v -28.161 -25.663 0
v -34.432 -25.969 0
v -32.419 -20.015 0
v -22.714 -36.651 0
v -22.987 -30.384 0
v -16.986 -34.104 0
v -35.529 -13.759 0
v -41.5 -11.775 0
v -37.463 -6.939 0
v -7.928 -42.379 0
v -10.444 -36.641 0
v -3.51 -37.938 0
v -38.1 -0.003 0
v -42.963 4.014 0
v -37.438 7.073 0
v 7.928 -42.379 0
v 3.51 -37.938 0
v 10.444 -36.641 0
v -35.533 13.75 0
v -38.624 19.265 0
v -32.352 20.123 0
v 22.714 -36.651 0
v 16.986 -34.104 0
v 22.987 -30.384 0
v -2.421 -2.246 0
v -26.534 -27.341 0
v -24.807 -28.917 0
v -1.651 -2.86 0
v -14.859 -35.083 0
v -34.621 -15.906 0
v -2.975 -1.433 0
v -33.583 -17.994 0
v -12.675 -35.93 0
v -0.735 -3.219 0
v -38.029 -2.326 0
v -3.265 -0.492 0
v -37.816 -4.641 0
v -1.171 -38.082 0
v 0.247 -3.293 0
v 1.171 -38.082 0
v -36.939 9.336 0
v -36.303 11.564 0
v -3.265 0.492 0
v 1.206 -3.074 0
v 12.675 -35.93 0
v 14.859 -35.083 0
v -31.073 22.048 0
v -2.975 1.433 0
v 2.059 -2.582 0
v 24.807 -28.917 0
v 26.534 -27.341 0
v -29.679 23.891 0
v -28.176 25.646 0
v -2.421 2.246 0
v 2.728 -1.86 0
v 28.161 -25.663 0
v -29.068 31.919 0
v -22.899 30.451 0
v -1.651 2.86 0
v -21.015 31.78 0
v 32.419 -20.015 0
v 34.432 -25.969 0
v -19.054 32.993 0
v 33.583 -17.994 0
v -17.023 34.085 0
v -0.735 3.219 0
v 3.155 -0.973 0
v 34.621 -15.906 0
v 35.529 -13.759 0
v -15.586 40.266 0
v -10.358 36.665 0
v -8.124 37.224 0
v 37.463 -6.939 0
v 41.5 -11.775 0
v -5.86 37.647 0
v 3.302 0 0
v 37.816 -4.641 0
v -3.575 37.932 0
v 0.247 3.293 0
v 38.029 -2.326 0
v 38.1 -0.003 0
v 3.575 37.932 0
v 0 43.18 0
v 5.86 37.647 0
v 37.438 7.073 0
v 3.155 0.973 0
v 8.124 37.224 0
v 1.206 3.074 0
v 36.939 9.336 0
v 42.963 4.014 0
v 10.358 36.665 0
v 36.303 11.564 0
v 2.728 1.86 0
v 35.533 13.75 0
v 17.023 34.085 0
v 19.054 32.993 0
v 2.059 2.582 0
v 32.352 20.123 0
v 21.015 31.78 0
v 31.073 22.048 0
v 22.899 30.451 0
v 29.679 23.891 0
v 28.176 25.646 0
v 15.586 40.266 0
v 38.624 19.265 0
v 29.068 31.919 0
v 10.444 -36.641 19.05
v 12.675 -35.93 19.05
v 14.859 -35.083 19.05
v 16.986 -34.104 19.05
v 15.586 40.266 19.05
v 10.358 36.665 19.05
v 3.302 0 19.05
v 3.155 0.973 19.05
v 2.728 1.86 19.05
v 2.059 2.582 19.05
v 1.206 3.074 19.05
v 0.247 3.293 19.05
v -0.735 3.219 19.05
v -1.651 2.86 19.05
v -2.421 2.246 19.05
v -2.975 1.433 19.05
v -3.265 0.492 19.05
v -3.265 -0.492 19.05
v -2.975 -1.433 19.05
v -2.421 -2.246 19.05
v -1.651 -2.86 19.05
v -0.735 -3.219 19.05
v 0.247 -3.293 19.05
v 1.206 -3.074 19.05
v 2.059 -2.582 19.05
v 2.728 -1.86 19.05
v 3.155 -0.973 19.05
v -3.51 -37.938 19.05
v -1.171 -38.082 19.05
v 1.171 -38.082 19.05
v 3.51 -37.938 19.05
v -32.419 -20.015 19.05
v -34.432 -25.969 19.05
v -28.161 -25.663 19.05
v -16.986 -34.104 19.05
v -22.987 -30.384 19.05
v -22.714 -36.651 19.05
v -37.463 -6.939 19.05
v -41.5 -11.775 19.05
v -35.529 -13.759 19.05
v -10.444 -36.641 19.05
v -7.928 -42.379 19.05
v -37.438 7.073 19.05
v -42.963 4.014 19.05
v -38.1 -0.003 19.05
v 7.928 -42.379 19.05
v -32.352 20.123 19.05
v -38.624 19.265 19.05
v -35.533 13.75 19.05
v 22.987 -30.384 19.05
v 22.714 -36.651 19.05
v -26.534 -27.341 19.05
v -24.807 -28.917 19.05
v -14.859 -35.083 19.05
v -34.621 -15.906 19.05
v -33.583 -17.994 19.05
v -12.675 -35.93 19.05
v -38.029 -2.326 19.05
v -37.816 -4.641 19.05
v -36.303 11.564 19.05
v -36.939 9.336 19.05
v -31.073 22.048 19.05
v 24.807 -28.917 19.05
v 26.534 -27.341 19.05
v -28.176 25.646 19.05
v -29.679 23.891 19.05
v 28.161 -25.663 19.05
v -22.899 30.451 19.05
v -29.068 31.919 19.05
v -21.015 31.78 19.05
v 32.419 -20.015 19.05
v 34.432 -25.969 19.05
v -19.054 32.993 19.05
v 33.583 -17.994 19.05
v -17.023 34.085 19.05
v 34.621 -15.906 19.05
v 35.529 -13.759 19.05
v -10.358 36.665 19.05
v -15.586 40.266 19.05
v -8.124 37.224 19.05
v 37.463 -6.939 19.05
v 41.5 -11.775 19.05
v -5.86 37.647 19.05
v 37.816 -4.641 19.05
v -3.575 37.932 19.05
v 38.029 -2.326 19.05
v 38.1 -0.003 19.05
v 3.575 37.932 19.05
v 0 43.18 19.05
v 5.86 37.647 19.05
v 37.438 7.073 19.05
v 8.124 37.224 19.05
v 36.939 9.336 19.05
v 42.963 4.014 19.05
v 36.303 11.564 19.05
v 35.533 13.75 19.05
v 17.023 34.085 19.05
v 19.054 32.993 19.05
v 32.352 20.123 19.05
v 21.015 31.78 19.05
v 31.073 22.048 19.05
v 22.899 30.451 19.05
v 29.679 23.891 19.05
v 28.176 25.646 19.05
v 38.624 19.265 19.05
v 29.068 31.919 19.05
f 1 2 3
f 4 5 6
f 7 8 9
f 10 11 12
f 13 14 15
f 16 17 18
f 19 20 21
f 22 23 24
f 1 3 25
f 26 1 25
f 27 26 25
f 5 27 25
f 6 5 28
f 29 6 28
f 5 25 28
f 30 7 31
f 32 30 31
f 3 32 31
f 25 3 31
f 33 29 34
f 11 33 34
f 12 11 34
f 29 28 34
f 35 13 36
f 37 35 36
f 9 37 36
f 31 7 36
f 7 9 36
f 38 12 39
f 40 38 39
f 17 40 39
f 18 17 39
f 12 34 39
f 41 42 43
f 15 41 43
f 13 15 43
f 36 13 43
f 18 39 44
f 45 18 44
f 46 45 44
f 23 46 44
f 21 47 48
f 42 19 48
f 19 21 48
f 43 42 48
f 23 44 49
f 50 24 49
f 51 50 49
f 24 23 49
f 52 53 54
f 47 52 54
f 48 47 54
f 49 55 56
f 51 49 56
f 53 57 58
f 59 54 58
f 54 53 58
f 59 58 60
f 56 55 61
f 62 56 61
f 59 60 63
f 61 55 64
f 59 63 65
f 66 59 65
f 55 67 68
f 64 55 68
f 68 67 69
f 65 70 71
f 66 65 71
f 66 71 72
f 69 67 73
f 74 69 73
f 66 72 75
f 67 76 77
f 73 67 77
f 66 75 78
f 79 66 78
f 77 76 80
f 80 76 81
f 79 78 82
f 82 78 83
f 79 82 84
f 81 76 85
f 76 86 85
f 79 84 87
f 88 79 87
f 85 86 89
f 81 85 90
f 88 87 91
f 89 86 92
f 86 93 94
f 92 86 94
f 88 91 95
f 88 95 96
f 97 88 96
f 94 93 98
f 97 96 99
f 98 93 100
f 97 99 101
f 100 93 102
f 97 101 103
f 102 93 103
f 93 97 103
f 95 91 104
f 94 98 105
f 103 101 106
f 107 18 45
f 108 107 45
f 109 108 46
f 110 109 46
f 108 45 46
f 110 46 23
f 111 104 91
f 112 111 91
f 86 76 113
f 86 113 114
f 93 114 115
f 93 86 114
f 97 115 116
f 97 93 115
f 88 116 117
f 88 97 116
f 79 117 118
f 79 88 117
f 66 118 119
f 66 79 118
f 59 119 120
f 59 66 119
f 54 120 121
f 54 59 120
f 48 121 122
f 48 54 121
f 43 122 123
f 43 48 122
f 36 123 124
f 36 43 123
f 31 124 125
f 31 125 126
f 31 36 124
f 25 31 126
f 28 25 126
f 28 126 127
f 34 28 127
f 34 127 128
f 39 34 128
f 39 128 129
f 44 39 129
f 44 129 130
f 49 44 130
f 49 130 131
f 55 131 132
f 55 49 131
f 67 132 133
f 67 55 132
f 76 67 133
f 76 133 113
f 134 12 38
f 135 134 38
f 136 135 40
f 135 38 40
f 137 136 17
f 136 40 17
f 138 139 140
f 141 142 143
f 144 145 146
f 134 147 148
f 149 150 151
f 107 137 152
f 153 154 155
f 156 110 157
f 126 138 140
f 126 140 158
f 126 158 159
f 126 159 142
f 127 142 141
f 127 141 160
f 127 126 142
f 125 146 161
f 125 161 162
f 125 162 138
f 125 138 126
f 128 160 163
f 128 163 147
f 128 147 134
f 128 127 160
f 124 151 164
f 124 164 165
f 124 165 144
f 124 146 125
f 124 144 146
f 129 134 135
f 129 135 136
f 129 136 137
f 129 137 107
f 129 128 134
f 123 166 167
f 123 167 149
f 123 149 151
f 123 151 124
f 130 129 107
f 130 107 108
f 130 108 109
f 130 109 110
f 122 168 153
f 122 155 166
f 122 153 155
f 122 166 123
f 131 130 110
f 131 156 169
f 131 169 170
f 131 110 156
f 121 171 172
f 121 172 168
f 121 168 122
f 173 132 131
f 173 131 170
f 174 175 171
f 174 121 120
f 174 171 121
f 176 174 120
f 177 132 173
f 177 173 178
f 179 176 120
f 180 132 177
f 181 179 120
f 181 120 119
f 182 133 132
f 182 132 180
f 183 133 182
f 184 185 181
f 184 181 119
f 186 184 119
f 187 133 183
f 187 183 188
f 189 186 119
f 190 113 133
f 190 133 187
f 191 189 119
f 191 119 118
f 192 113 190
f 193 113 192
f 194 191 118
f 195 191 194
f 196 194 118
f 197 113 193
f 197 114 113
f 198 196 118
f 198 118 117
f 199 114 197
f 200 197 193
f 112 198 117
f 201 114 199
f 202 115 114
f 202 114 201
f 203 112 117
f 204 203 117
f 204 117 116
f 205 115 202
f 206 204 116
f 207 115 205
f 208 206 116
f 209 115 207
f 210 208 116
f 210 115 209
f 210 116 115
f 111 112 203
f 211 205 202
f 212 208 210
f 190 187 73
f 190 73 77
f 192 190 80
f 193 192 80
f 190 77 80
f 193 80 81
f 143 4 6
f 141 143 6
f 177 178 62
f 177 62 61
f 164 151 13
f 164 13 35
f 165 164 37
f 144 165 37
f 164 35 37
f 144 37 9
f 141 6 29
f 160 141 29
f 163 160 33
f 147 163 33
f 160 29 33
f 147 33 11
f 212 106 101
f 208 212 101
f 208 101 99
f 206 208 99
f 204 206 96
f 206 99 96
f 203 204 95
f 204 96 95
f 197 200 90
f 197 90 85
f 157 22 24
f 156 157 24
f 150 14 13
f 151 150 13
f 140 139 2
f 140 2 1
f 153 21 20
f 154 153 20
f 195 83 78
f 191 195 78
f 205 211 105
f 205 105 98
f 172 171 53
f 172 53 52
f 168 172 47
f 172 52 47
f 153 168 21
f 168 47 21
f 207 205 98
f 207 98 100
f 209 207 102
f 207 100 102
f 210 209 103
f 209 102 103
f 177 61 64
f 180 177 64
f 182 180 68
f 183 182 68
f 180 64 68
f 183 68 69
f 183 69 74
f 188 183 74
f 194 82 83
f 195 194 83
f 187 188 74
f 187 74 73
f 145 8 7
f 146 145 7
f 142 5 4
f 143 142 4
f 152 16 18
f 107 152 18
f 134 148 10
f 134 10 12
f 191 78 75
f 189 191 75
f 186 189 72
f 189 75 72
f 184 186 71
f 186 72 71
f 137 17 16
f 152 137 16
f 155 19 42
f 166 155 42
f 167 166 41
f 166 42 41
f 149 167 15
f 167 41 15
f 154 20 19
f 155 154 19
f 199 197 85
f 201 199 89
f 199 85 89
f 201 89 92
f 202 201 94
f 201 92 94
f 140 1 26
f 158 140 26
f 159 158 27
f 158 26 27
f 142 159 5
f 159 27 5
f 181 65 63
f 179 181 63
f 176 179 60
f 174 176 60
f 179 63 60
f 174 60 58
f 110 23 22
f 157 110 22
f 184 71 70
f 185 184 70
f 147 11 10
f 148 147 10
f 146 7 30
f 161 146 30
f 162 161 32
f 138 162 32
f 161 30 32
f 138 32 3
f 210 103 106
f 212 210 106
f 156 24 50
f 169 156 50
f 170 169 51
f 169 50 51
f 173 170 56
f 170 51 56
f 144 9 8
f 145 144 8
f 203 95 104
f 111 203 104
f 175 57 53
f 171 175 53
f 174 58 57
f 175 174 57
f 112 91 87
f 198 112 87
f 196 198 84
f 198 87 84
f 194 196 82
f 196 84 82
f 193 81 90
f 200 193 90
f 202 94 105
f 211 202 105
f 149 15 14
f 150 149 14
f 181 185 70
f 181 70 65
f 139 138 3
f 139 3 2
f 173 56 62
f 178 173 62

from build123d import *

# Parameters (mm, degrees)
F0_R     = 3.302
F1_DEPTH = 19.05


with BuildPart() as f1:
    # F0 (on Top) → F1 (new body)
    with BuildSketch(Plane.XY):
        with BuildLine():
            ThreePointArc((10.3583260114, 36.6649025942), (6.9953685106, 37.4523005889), (3.5749223592, 37.9319117647))
            ThreePointArc((3.5749223592, 37.9319117647), (1.7894359118, 38.0579547417), (0, 38.1))
            ThreePointArc((0, 38.1), (-1.7894359118, 38.0579547417), (-3.5749223592, 37.9319117647))
            ThreePointArc((-3.5749223592, 37.9319117647), (-6.9953685106, 37.4523005889), (-10.3583260114, 36.6649025942))
            ThreePointArc((-10.3583260114, 36.6649025942), (-12.0685716334, 36.1380627418), (-13.7521919191, 35.5314961326))
            ThreePointArc((-13.7521919191, 35.5314961326), (-15.4046733923, 34.8468942329), (-17.0232026859, 34.0854891459))
            ThreePointArc((-17.0232026859, 34.0854891459), (-20.043465356, 32.4016897171), (-22.8986264736, 30.450991866))
            ThreePointArc((-22.8986264736, 30.450991866), (-24.3017474593, 29.3433990946), (-25.6513716497, 28.1712110583))
            ThreePointArc((-25.6513716497, 28.1712110583), (-26.9433776908, 26.9381587829), (-28.1761796584, 25.6459139017))
            ThreePointArc((-28.1761796584, 25.6459139017), (-30.3898416418, 22.9797198631), (-32.3520943167, 20.1234190266))
            ThreePointArc((-32.3520943167, 20.1234190266), (-33.2587932077, 18.5866262234), (-34.0925451571, 17.0090671323))
            ThreePointArc((-34.0925451571, 17.0090671323), (-34.850649889, 15.3961749248), (-35.5325008857, 13.7495956597))
            ThreePointArc((-35.5325008857, 13.7495956597), (-36.6375523151, 10.4546525701), (-37.4377693794, 7.0727239376))
            ThreePointArc((-37.4377693794, 7.0727239376), (-37.7272799225, 5.3162345369), (-37.9344264404, 3.548139039))
            ThreePointArc((-37.9344264404, 3.548139039), (-38.0586453199, 1.7746876952), (-38.0999999094, -0.002627639))
            ThreePointArc((-38.0999999094, -0.002627639), (-37.9402497555, -3.4853189945), (-37.4628173003, -6.938826985))
            ThreePointArc((-37.4628173003, -6.938826985), (-37.0988170111, -8.6768529074), (-36.6542295707, -10.3960307125))
            ThreePointArc((-36.6542295707, -10.3960307125), (-36.1307521934, -12.0904402708), (-35.5289940754, -13.7586547304))
            ThreePointArc((-35.5289940754, -13.7586547304), (-34.1178249717, -16.9583023679), (-32.4192289635, -20.015084147))
            ThreePointArc((-32.4192289635, -20.015084147), (-31.4537756655, -21.5004650271), (-30.4203176662, -22.939360782))
            ThreePointArc((-30.4203176662, -22.939360782), (-29.3223073038, -24.3271924887), (-28.1610369919, -25.6625407071))
            ThreePointArc((-28.1610369919, -25.6625407071), (-25.6829106001, -28.1424608573), (-22.9873211216, -30.3840923454))
            ThreePointArc((-22.9873211216, -30.3840923454), (-21.5527887081, -31.4179454915), (-20.0718320683, -32.3841250835))
            ThreePointArc((-20.0718320683, -32.3841250835), (-18.5487381489, -33.279938598), (-16.9857473781, -34.1041696279))
            ThreePointArc((-16.9857473781, -34.1041696279), (-13.7735289525, -35.5232304302), (-10.4442981946, -36.6405053898))
            ThreePointArc((-10.4442981946, -36.6405053898), (-8.7349433821, -37.0851825412), (-7.0068164437, -37.4501605247))
            ThreePointArc((-7.0068164437, -37.4501605247), (-5.2640649753, -37.7345944716), (-3.5100061972, -37.9379738059))
            ThreePointArc((-3.5100061972, -37.9379738059), (0, -38.1), (3.5100061972, -37.9379738059))
            ThreePointArc((3.5100061972, -37.9379738059), (5.2640649753, -37.7345944716), (7.0068164437, -37.4501605247))
            ThreePointArc((7.0068164437, -37.4501605247), (8.7349433821, -37.0851825412), (10.4442981946, -36.6405053898))
            ThreePointArc((10.4442981946, -36.6405053898), (13.7735289525, -35.5232304302), (16.9857473781, -34.1041696279))
            ThreePointArc((16.9857473781, -34.1041696279), (18.5487381489, -33.279938598), (20.0718320683, -32.3841250835))
            ThreePointArc((20.0718320683, -32.3841250835), (21.5527887081, -31.4179454915), (22.9873211216, -30.3840923454))
            ThreePointArc((22.9873211216, -30.3840923454), (25.6829106001, -28.1424608573), (28.1610369919, -25.6625407071))
            ThreePointArc((28.1610369919, -25.6625407071), (29.3223073038, -24.3271924887), (30.4203176662, -22.939360782))
            ThreePointArc((30.4203176662, -22.939360782), (31.4537756655, -21.5004650271), (32.4192289635, -20.015084147))
            ThreePointArc((32.4192289635, -20.015084147), (34.1178249717, -16.9583023679), (35.5289940754, -13.7586547304))
            ThreePointArc((35.5289940754, -13.7586547304), (36.1307521934, -12.0904402708), (36.6542295707, -10.3960307125))
            ThreePointArc((36.6542295707, -10.3960307125), (37.0988170111, -8.6768529074), (37.4628173003, -6.938826985))
            ThreePointArc((37.4628173003, -6.938826985), (37.9402497555, -3.4853189945), (38.0999999094, -0.002627639))
            ThreePointArc((38.0999999094, -0.002627639), (38.0999999773, -0.0013138195), (38.1, 0))
            ThreePointArc((38.1, 0), (38.0585840999, 1.7760000875), (37.9344264404, 3.548139039))
            ThreePointArc((37.9344264404, 3.548139039), (37.7272799225, 5.3162345369), (37.4377693794, 7.0727239376))
            ThreePointArc((37.4377693794, 7.0727239376), (36.6375523151, 10.4546525701), (35.5325008857, 13.7495956597))
            ThreePointArc((35.5325008857, 13.7495956597), (34.850649889, 15.3961749248), (34.0925451571, 17.0090671323))
            ThreePointArc((34.0925451571, 17.0090671323), (33.2587932077, 18.5866262234), (32.3520943167, 20.1234190266))
            ThreePointArc((32.3520943167, 20.1234190266), (30.3898416418, 22.9797198631), (28.1761796584, 25.6459139017))
            ThreePointArc((28.1761796584, 25.6459139017), (26.9433776908, 26.9381587829), (25.6513716497, 28.1712110583))
            ThreePointArc((25.6513716497, 28.1712110583), (24.3017474593, 29.3433990946), (22.8986264736, 30.450991866))
            ThreePointArc((22.8986264736, 30.450991866), (20.043465356, 32.4016897171), (17.0232026859, 34.0854891459))
            ThreePointArc((17.0232026859, 34.0854891459), (15.4046733923, 34.8468942329), (13.7521919191, 35.5314961326))
            ThreePointArc((13.7521919191, 35.5314961326), (12.0685716334, 36.1380627418), (10.3583260114, 36.6649025942))
        make_face()
        Circle(F0_R, mode=Mode.SUBTRACT)
        with BuildLine():
            ThreePointArc((0, 38.1), (1.7894359118, 38.0579547417), (3.5749223592, 37.9319117647))
            Line((3.5749223592, 37.9319117647), (0, 43.18))
            Line((0, 43.18), (0, 38.1))
        make_face()
        with BuildLine():
            ThreePointArc((-3.5749223592, 37.9319117647), (-1.7894359118, 38.0579547417), (0, 38.1))
            Line((0, 38.1), (0, 43.18))
            Line((0, 43.18), (-3.5749223592, 37.9319117647))
        make_face()
        with BuildLine():
            Line((15.5864953389, 40.2663790638), (10.3583260114, 36.6649025942))
            ThreePointArc((10.3583260114, 36.6649025942), (12.0685716334, 36.1380627418), (13.7521919191, 35.5314961326))
            Line((13.7521919191, 35.5314961326), (15.5864953389, 40.2663790638))
        make_face()
        with BuildLine():
            Line((15.5864953389, 40.2663790638), (13.7521919191, 35.5314961326))
            ThreePointArc((13.7521919191, 35.5314961326), (15.4046733923, 34.8468942329), (17.0232026859, 34.0854891459))
            Line((17.0232026859, 34.0854891459), (15.5864953389, 40.2663790638))
        make_face()
        with BuildLine():
            ThreePointArc((-13.7521919191, 35.5314961326), (-12.0685716334, 36.1380627418), (-10.3583260114, 36.6649025942))
            Line((-10.3583260114, 36.6649025942), (-15.5864953389, 40.2663790638))
            Line((-15.5864953389, 40.2663790638), (-13.7521919191, 35.5314961326))
        make_face()
        with BuildLine():
            ThreePointArc((-17.0232026859, 34.0854891459), (-15.4046733923, 34.8468942329), (-13.7521919191, 35.5314961326))
            Line((-13.7521919191, 35.5314961326), (-15.5864953389, 40.2663790638))
            Line((-15.5864953389, 40.2663790638), (-17.0232026859, 34.0854891459))
        make_face()
        with BuildLine():
            Line((29.0679481145, 31.9190169075), (22.8986264736, 30.450991866))
            ThreePointArc((22.8986264736, 30.450991866), (24.3017474593, 29.3433990946), (25.6513716497, 28.1712110583))
            Line((25.6513716497, 28.1712110583), (29.0679481145, 31.9190169075))
        make_face()
        with BuildLine():
            Line((29.0679481145, 31.9190169075), (25.6513716497, 28.1712110583))
            ThreePointArc((25.6513716497, 28.1712110583), (26.9433776908, 26.9381587829), (28.1761796584, 25.6459139017))
            Line((28.1761796584, 25.6459139017), (29.0679481145, 31.9190169075))
        make_face()
        with BuildLine():
            ThreePointArc((-25.6513716497, 28.1712110583), (-24.3017474593, 29.3433990946), (-22.8986264736, 30.450991866))
            Line((-22.8986264736, 30.450991866), (-29.0679481145, 31.9190169075))
            Line((-29.0679481145, 31.9190169075), (-25.6513716497, 28.1712110583))
        make_face()
        with BuildLine():
            ThreePointArc((-28.1761796584, 25.6459139017), (-26.9433776908, 26.9381587829), (-25.6513716497, 28.1712110583))
            Line((-25.6513716497, 28.1712110583), (-29.0679481145, 31.9190169075))
            Line((-29.0679481145, 31.9190169075), (-28.1761796584, 25.6459139017))
        make_face()
        with BuildLine():
            Line((38.6236134262, 19.2652710447), (32.3520943167, 20.1234190266))
            ThreePointArc((32.3520943167, 20.1234190266), (33.2587932077, 18.5866262234), (34.0925451571, 17.0090671323))
            Line((34.0925451571, 17.0090671323), (38.6236134262, 19.2652710447))
        make_face()
        with BuildLine():
            Line((38.6236134262, 19.2652710447), (34.0925451571, 17.0090671323))
            ThreePointArc((34.0925451571, 17.0090671323), (34.850649889, 15.3961749248), (35.5325008857, 13.7495956597))
            Line((35.5325008857, 13.7495956597), (38.6236134262, 19.2652710447))
        make_face()
        with BuildLine():
            ThreePointArc((-34.0925451571, 17.0090671323), (-33.2587932077, 18.5866262234), (-32.3520943167, 20.1234190266))
            Line((-32.3520943167, 20.1234190266), (-38.6236134262, 19.2652710447))
            Line((-38.6236134262, 19.2652710447), (-34.0925451571, 17.0090671323))
        make_face()
        with BuildLine():
            ThreePointArc((-35.5325008857, 13.7495956597), (-34.850649889, 15.3961749248), (-34.0925451571, 17.0090671323))
            Line((-34.0925451571, 17.0090671323), (-38.6236134262, 19.2652710447))
            Line((-38.6236134262, 19.2652710447), (-35.5325008857, 13.7495956597))
        make_face()
        with BuildLine():
            Line((42.9629457239, 4.014099971), (37.4377693794, 7.0727239376))
            ThreePointArc((37.4377693794, 7.0727239376), (37.7272799225, 5.3162345369), (37.9344264404, 3.548139039))
            Line((37.9344264404, 3.548139039), (42.9629457239, 4.014099971))
        make_face()
        with BuildLine():
            Line((42.9629457239, 4.014099971), (37.9344264404, 3.548139039))
            ThreePointArc((37.9344264404, 3.548139039), (38.0585840999, 1.7760000875), (38.1, 0))
            ThreePointArc((38.1, 0), (38.0999999773, -0.0013138195), (38.0999999094, -0.002627639))
            Line((38.0999999094, -0.002627639), (42.9629457239, 4.014099971))
        make_face()
        with BuildLine():
            ThreePointArc((-37.9344264404, 3.548139039), (-37.7272799225, 5.3162345369), (-37.4377693794, 7.0727239376))
            Line((-37.4377693794, 7.0727239376), (-42.9629457239, 4.014099971))
            Line((-42.9629457239, 4.014099971), (-37.9344264404, 3.548139039))
        make_face()
        with BuildLine():
            ThreePointArc((-38.0999999094, -0.002627639), (-38.0586453199, 1.7746876952), (-37.9344264404, 3.548139039))
            Line((-37.9344264404, 3.548139039), (-42.9629457239, 4.014099971))
            Line((-42.9629457239, 4.014099971), (-38.0999999094, -0.002627639))
        make_face()
        with BuildLine():
            Line((41.4998941356, -11.7747411505), (37.4628173003, -6.938826985))
            ThreePointArc((37.4628173003, -6.938826985), (37.0988170111, -8.6768529074), (36.6542295707, -10.3960307125))
            Line((36.6542295707, -10.3960307125), (41.4998941356, -11.7747411505))
        make_face()
        with BuildLine():
            Line((41.4998941356, -11.7747411505), (36.6542295707, -10.3960307125))
            ThreePointArc((36.6542295707, -10.3960307125), (36.1307521934, -12.0904402708), (35.5289940754, -13.7586547304))
            Line((35.5289940754, -13.7586547304), (41.4998941356, -11.7747411505))
        make_face()
        with BuildLine():
            ThreePointArc((-36.6542295707, -10.3960307125), (-37.0988170111, -8.6768529074), (-37.4628173003, -6.938826985))
            Line((-37.4628173003, -6.938826985), (-41.4998941356, -11.7747411505))
            Line((-41.4998941356, -11.7747411505), (-36.6542295707, -10.3960307125))
        make_face()
        with BuildLine():
            ThreePointArc((-35.5289940754, -13.7586547304), (-36.1307521934, -12.0904402708), (-36.6542295707, -10.3960307125))
            Line((-36.6542295707, -10.3960307125), (-41.4998941356, -11.7747411505))
            Line((-41.4998941356, -11.7747411505), (-35.5289940754, -13.7586547304))
        make_face()
        with BuildLine():
            Line((34.4320518855, -25.9688818373), (32.4192289635, -20.015084147))
            ThreePointArc((32.4192289635, -20.015084147), (31.4537756655, -21.5004650271), (30.4203176662, -22.939360782))
            Line((30.4203176662, -22.939360782), (34.4320518855, -25.9688818373))
        make_face()
        with BuildLine():
            Line((34.4320518855, -25.9688818373), (30.4203176662, -22.939360782))
            ThreePointArc((30.4203176662, -22.939360782), (29.3223073038, -24.3271924887), (28.1610369919, -25.6625407071))
            Line((28.1610369919, -25.6625407071), (34.4320518855, -25.9688818373))
        make_face()
        with BuildLine():
            ThreePointArc((-30.4203176662, -22.939360782), (-31.4537756655, -21.5004650271), (-32.4192289635, -20.015084147))
            Line((-32.4192289635, -20.015084147), (-34.4320518855, -25.9688818373))
            Line((-34.4320518855, -25.9688818373), (-30.4203176662, -22.939360782))
        make_face()
        with BuildLine():
            ThreePointArc((-28.1610369919, -25.6625407071), (-29.3223073038, -24.3271924887), (-30.4203176662, -22.939360782))
            Line((-30.4203176662, -22.939360782), (-34.4320518855, -25.9688818373))
            Line((-34.4320518855, -25.9688818373), (-28.1610369919, -25.6625407071))
        make_face()
        with BuildLine():
            Line((22.7139702337, -36.6513247372), (22.9873211216, -30.3840923454))
            ThreePointArc((22.9873211216, -30.3840923454), (21.5527887081, -31.4179454915), (20.0718320683, -32.3841250835))
            Line((20.0718320683, -32.3841250835), (22.7139702337, -36.6513247372))
        make_face()
        with BuildLine():
            Line((22.7139702337, -36.6513247372), (20.0718320683, -32.3841250835))
            ThreePointArc((20.0718320683, -32.3841250835), (18.5487381489, -33.279938598), (16.9857473781, -34.1041696279))
            Line((16.9857473781, -34.1041696279), (22.7139702337, -36.6513247372))
        make_face()
        with BuildLine():
            ThreePointArc((-20.0718320683, -32.3841250835), (-21.5527887081, -31.4179454915), (-22.9873211216, -30.3840923454))
            Line((-22.9873211216, -30.3840923454), (-22.7139702337, -36.6513247372))
            Line((-22.7139702337, -36.6513247372), (-20.0718320683, -32.3841250835))
        make_face()
        with BuildLine():
            ThreePointArc((-16.9857473781, -34.1041696279), (-18.5487381489, -33.279938598), (-20.0718320683, -32.3841250835))
            Line((-20.0718320683, -32.3841250835), (-22.7139702337, -36.6513247372))
            Line((-22.7139702337, -36.6513247372), (-16.9857473781, -34.1041696279))
        make_face()
        with BuildLine():
            Line((7.9282410393, -42.3793467431), (10.4442981946, -36.6405053898))
            ThreePointArc((10.4442981946, -36.6405053898), (8.7349433821, -37.0851825412), (7.0068164437, -37.4501605247))
            Line((7.0068164437, -37.4501605247), (7.9282410393, -42.3793467431))
        make_face()
        with BuildLine():
            Line((7.9282410393, -42.3793467431), (7.0068164437, -37.4501605247))
            ThreePointArc((7.0068164437, -37.4501605247), (5.2640649753, -37.7345944716), (3.5100061972, -37.9379738059))
            Line((3.5100061972, -37.9379738059), (7.9282410393, -42.3793467431))
        make_face()
        with BuildLine():
            ThreePointArc((-7.0068164437, -37.4501605247), (-8.7349433821, -37.0851825412), (-10.4442981946, -36.6405053898))
            Line((-10.4442981946, -36.6405053898), (-7.9282410393, -42.3793467431))
            Line((-7.9282410393, -42.3793467431), (-7.0068164437, -37.4501605247))
        make_face()
        with BuildLine():
            ThreePointArc((-3.5100061972, -37.9379738059), (-5.2640649753, -37.7345944716), (-7.0068164437, -37.4501605247))
            Line((-7.0068164437, -37.4501605247), (-7.9282410393, -42.3793467431))
            Line((-7.9282410393, -42.3793467431), (-3.5100061972, -37.9379738059))
        make_face()
    extrude(amount=F1_DEPTH)


solid = f1.part
